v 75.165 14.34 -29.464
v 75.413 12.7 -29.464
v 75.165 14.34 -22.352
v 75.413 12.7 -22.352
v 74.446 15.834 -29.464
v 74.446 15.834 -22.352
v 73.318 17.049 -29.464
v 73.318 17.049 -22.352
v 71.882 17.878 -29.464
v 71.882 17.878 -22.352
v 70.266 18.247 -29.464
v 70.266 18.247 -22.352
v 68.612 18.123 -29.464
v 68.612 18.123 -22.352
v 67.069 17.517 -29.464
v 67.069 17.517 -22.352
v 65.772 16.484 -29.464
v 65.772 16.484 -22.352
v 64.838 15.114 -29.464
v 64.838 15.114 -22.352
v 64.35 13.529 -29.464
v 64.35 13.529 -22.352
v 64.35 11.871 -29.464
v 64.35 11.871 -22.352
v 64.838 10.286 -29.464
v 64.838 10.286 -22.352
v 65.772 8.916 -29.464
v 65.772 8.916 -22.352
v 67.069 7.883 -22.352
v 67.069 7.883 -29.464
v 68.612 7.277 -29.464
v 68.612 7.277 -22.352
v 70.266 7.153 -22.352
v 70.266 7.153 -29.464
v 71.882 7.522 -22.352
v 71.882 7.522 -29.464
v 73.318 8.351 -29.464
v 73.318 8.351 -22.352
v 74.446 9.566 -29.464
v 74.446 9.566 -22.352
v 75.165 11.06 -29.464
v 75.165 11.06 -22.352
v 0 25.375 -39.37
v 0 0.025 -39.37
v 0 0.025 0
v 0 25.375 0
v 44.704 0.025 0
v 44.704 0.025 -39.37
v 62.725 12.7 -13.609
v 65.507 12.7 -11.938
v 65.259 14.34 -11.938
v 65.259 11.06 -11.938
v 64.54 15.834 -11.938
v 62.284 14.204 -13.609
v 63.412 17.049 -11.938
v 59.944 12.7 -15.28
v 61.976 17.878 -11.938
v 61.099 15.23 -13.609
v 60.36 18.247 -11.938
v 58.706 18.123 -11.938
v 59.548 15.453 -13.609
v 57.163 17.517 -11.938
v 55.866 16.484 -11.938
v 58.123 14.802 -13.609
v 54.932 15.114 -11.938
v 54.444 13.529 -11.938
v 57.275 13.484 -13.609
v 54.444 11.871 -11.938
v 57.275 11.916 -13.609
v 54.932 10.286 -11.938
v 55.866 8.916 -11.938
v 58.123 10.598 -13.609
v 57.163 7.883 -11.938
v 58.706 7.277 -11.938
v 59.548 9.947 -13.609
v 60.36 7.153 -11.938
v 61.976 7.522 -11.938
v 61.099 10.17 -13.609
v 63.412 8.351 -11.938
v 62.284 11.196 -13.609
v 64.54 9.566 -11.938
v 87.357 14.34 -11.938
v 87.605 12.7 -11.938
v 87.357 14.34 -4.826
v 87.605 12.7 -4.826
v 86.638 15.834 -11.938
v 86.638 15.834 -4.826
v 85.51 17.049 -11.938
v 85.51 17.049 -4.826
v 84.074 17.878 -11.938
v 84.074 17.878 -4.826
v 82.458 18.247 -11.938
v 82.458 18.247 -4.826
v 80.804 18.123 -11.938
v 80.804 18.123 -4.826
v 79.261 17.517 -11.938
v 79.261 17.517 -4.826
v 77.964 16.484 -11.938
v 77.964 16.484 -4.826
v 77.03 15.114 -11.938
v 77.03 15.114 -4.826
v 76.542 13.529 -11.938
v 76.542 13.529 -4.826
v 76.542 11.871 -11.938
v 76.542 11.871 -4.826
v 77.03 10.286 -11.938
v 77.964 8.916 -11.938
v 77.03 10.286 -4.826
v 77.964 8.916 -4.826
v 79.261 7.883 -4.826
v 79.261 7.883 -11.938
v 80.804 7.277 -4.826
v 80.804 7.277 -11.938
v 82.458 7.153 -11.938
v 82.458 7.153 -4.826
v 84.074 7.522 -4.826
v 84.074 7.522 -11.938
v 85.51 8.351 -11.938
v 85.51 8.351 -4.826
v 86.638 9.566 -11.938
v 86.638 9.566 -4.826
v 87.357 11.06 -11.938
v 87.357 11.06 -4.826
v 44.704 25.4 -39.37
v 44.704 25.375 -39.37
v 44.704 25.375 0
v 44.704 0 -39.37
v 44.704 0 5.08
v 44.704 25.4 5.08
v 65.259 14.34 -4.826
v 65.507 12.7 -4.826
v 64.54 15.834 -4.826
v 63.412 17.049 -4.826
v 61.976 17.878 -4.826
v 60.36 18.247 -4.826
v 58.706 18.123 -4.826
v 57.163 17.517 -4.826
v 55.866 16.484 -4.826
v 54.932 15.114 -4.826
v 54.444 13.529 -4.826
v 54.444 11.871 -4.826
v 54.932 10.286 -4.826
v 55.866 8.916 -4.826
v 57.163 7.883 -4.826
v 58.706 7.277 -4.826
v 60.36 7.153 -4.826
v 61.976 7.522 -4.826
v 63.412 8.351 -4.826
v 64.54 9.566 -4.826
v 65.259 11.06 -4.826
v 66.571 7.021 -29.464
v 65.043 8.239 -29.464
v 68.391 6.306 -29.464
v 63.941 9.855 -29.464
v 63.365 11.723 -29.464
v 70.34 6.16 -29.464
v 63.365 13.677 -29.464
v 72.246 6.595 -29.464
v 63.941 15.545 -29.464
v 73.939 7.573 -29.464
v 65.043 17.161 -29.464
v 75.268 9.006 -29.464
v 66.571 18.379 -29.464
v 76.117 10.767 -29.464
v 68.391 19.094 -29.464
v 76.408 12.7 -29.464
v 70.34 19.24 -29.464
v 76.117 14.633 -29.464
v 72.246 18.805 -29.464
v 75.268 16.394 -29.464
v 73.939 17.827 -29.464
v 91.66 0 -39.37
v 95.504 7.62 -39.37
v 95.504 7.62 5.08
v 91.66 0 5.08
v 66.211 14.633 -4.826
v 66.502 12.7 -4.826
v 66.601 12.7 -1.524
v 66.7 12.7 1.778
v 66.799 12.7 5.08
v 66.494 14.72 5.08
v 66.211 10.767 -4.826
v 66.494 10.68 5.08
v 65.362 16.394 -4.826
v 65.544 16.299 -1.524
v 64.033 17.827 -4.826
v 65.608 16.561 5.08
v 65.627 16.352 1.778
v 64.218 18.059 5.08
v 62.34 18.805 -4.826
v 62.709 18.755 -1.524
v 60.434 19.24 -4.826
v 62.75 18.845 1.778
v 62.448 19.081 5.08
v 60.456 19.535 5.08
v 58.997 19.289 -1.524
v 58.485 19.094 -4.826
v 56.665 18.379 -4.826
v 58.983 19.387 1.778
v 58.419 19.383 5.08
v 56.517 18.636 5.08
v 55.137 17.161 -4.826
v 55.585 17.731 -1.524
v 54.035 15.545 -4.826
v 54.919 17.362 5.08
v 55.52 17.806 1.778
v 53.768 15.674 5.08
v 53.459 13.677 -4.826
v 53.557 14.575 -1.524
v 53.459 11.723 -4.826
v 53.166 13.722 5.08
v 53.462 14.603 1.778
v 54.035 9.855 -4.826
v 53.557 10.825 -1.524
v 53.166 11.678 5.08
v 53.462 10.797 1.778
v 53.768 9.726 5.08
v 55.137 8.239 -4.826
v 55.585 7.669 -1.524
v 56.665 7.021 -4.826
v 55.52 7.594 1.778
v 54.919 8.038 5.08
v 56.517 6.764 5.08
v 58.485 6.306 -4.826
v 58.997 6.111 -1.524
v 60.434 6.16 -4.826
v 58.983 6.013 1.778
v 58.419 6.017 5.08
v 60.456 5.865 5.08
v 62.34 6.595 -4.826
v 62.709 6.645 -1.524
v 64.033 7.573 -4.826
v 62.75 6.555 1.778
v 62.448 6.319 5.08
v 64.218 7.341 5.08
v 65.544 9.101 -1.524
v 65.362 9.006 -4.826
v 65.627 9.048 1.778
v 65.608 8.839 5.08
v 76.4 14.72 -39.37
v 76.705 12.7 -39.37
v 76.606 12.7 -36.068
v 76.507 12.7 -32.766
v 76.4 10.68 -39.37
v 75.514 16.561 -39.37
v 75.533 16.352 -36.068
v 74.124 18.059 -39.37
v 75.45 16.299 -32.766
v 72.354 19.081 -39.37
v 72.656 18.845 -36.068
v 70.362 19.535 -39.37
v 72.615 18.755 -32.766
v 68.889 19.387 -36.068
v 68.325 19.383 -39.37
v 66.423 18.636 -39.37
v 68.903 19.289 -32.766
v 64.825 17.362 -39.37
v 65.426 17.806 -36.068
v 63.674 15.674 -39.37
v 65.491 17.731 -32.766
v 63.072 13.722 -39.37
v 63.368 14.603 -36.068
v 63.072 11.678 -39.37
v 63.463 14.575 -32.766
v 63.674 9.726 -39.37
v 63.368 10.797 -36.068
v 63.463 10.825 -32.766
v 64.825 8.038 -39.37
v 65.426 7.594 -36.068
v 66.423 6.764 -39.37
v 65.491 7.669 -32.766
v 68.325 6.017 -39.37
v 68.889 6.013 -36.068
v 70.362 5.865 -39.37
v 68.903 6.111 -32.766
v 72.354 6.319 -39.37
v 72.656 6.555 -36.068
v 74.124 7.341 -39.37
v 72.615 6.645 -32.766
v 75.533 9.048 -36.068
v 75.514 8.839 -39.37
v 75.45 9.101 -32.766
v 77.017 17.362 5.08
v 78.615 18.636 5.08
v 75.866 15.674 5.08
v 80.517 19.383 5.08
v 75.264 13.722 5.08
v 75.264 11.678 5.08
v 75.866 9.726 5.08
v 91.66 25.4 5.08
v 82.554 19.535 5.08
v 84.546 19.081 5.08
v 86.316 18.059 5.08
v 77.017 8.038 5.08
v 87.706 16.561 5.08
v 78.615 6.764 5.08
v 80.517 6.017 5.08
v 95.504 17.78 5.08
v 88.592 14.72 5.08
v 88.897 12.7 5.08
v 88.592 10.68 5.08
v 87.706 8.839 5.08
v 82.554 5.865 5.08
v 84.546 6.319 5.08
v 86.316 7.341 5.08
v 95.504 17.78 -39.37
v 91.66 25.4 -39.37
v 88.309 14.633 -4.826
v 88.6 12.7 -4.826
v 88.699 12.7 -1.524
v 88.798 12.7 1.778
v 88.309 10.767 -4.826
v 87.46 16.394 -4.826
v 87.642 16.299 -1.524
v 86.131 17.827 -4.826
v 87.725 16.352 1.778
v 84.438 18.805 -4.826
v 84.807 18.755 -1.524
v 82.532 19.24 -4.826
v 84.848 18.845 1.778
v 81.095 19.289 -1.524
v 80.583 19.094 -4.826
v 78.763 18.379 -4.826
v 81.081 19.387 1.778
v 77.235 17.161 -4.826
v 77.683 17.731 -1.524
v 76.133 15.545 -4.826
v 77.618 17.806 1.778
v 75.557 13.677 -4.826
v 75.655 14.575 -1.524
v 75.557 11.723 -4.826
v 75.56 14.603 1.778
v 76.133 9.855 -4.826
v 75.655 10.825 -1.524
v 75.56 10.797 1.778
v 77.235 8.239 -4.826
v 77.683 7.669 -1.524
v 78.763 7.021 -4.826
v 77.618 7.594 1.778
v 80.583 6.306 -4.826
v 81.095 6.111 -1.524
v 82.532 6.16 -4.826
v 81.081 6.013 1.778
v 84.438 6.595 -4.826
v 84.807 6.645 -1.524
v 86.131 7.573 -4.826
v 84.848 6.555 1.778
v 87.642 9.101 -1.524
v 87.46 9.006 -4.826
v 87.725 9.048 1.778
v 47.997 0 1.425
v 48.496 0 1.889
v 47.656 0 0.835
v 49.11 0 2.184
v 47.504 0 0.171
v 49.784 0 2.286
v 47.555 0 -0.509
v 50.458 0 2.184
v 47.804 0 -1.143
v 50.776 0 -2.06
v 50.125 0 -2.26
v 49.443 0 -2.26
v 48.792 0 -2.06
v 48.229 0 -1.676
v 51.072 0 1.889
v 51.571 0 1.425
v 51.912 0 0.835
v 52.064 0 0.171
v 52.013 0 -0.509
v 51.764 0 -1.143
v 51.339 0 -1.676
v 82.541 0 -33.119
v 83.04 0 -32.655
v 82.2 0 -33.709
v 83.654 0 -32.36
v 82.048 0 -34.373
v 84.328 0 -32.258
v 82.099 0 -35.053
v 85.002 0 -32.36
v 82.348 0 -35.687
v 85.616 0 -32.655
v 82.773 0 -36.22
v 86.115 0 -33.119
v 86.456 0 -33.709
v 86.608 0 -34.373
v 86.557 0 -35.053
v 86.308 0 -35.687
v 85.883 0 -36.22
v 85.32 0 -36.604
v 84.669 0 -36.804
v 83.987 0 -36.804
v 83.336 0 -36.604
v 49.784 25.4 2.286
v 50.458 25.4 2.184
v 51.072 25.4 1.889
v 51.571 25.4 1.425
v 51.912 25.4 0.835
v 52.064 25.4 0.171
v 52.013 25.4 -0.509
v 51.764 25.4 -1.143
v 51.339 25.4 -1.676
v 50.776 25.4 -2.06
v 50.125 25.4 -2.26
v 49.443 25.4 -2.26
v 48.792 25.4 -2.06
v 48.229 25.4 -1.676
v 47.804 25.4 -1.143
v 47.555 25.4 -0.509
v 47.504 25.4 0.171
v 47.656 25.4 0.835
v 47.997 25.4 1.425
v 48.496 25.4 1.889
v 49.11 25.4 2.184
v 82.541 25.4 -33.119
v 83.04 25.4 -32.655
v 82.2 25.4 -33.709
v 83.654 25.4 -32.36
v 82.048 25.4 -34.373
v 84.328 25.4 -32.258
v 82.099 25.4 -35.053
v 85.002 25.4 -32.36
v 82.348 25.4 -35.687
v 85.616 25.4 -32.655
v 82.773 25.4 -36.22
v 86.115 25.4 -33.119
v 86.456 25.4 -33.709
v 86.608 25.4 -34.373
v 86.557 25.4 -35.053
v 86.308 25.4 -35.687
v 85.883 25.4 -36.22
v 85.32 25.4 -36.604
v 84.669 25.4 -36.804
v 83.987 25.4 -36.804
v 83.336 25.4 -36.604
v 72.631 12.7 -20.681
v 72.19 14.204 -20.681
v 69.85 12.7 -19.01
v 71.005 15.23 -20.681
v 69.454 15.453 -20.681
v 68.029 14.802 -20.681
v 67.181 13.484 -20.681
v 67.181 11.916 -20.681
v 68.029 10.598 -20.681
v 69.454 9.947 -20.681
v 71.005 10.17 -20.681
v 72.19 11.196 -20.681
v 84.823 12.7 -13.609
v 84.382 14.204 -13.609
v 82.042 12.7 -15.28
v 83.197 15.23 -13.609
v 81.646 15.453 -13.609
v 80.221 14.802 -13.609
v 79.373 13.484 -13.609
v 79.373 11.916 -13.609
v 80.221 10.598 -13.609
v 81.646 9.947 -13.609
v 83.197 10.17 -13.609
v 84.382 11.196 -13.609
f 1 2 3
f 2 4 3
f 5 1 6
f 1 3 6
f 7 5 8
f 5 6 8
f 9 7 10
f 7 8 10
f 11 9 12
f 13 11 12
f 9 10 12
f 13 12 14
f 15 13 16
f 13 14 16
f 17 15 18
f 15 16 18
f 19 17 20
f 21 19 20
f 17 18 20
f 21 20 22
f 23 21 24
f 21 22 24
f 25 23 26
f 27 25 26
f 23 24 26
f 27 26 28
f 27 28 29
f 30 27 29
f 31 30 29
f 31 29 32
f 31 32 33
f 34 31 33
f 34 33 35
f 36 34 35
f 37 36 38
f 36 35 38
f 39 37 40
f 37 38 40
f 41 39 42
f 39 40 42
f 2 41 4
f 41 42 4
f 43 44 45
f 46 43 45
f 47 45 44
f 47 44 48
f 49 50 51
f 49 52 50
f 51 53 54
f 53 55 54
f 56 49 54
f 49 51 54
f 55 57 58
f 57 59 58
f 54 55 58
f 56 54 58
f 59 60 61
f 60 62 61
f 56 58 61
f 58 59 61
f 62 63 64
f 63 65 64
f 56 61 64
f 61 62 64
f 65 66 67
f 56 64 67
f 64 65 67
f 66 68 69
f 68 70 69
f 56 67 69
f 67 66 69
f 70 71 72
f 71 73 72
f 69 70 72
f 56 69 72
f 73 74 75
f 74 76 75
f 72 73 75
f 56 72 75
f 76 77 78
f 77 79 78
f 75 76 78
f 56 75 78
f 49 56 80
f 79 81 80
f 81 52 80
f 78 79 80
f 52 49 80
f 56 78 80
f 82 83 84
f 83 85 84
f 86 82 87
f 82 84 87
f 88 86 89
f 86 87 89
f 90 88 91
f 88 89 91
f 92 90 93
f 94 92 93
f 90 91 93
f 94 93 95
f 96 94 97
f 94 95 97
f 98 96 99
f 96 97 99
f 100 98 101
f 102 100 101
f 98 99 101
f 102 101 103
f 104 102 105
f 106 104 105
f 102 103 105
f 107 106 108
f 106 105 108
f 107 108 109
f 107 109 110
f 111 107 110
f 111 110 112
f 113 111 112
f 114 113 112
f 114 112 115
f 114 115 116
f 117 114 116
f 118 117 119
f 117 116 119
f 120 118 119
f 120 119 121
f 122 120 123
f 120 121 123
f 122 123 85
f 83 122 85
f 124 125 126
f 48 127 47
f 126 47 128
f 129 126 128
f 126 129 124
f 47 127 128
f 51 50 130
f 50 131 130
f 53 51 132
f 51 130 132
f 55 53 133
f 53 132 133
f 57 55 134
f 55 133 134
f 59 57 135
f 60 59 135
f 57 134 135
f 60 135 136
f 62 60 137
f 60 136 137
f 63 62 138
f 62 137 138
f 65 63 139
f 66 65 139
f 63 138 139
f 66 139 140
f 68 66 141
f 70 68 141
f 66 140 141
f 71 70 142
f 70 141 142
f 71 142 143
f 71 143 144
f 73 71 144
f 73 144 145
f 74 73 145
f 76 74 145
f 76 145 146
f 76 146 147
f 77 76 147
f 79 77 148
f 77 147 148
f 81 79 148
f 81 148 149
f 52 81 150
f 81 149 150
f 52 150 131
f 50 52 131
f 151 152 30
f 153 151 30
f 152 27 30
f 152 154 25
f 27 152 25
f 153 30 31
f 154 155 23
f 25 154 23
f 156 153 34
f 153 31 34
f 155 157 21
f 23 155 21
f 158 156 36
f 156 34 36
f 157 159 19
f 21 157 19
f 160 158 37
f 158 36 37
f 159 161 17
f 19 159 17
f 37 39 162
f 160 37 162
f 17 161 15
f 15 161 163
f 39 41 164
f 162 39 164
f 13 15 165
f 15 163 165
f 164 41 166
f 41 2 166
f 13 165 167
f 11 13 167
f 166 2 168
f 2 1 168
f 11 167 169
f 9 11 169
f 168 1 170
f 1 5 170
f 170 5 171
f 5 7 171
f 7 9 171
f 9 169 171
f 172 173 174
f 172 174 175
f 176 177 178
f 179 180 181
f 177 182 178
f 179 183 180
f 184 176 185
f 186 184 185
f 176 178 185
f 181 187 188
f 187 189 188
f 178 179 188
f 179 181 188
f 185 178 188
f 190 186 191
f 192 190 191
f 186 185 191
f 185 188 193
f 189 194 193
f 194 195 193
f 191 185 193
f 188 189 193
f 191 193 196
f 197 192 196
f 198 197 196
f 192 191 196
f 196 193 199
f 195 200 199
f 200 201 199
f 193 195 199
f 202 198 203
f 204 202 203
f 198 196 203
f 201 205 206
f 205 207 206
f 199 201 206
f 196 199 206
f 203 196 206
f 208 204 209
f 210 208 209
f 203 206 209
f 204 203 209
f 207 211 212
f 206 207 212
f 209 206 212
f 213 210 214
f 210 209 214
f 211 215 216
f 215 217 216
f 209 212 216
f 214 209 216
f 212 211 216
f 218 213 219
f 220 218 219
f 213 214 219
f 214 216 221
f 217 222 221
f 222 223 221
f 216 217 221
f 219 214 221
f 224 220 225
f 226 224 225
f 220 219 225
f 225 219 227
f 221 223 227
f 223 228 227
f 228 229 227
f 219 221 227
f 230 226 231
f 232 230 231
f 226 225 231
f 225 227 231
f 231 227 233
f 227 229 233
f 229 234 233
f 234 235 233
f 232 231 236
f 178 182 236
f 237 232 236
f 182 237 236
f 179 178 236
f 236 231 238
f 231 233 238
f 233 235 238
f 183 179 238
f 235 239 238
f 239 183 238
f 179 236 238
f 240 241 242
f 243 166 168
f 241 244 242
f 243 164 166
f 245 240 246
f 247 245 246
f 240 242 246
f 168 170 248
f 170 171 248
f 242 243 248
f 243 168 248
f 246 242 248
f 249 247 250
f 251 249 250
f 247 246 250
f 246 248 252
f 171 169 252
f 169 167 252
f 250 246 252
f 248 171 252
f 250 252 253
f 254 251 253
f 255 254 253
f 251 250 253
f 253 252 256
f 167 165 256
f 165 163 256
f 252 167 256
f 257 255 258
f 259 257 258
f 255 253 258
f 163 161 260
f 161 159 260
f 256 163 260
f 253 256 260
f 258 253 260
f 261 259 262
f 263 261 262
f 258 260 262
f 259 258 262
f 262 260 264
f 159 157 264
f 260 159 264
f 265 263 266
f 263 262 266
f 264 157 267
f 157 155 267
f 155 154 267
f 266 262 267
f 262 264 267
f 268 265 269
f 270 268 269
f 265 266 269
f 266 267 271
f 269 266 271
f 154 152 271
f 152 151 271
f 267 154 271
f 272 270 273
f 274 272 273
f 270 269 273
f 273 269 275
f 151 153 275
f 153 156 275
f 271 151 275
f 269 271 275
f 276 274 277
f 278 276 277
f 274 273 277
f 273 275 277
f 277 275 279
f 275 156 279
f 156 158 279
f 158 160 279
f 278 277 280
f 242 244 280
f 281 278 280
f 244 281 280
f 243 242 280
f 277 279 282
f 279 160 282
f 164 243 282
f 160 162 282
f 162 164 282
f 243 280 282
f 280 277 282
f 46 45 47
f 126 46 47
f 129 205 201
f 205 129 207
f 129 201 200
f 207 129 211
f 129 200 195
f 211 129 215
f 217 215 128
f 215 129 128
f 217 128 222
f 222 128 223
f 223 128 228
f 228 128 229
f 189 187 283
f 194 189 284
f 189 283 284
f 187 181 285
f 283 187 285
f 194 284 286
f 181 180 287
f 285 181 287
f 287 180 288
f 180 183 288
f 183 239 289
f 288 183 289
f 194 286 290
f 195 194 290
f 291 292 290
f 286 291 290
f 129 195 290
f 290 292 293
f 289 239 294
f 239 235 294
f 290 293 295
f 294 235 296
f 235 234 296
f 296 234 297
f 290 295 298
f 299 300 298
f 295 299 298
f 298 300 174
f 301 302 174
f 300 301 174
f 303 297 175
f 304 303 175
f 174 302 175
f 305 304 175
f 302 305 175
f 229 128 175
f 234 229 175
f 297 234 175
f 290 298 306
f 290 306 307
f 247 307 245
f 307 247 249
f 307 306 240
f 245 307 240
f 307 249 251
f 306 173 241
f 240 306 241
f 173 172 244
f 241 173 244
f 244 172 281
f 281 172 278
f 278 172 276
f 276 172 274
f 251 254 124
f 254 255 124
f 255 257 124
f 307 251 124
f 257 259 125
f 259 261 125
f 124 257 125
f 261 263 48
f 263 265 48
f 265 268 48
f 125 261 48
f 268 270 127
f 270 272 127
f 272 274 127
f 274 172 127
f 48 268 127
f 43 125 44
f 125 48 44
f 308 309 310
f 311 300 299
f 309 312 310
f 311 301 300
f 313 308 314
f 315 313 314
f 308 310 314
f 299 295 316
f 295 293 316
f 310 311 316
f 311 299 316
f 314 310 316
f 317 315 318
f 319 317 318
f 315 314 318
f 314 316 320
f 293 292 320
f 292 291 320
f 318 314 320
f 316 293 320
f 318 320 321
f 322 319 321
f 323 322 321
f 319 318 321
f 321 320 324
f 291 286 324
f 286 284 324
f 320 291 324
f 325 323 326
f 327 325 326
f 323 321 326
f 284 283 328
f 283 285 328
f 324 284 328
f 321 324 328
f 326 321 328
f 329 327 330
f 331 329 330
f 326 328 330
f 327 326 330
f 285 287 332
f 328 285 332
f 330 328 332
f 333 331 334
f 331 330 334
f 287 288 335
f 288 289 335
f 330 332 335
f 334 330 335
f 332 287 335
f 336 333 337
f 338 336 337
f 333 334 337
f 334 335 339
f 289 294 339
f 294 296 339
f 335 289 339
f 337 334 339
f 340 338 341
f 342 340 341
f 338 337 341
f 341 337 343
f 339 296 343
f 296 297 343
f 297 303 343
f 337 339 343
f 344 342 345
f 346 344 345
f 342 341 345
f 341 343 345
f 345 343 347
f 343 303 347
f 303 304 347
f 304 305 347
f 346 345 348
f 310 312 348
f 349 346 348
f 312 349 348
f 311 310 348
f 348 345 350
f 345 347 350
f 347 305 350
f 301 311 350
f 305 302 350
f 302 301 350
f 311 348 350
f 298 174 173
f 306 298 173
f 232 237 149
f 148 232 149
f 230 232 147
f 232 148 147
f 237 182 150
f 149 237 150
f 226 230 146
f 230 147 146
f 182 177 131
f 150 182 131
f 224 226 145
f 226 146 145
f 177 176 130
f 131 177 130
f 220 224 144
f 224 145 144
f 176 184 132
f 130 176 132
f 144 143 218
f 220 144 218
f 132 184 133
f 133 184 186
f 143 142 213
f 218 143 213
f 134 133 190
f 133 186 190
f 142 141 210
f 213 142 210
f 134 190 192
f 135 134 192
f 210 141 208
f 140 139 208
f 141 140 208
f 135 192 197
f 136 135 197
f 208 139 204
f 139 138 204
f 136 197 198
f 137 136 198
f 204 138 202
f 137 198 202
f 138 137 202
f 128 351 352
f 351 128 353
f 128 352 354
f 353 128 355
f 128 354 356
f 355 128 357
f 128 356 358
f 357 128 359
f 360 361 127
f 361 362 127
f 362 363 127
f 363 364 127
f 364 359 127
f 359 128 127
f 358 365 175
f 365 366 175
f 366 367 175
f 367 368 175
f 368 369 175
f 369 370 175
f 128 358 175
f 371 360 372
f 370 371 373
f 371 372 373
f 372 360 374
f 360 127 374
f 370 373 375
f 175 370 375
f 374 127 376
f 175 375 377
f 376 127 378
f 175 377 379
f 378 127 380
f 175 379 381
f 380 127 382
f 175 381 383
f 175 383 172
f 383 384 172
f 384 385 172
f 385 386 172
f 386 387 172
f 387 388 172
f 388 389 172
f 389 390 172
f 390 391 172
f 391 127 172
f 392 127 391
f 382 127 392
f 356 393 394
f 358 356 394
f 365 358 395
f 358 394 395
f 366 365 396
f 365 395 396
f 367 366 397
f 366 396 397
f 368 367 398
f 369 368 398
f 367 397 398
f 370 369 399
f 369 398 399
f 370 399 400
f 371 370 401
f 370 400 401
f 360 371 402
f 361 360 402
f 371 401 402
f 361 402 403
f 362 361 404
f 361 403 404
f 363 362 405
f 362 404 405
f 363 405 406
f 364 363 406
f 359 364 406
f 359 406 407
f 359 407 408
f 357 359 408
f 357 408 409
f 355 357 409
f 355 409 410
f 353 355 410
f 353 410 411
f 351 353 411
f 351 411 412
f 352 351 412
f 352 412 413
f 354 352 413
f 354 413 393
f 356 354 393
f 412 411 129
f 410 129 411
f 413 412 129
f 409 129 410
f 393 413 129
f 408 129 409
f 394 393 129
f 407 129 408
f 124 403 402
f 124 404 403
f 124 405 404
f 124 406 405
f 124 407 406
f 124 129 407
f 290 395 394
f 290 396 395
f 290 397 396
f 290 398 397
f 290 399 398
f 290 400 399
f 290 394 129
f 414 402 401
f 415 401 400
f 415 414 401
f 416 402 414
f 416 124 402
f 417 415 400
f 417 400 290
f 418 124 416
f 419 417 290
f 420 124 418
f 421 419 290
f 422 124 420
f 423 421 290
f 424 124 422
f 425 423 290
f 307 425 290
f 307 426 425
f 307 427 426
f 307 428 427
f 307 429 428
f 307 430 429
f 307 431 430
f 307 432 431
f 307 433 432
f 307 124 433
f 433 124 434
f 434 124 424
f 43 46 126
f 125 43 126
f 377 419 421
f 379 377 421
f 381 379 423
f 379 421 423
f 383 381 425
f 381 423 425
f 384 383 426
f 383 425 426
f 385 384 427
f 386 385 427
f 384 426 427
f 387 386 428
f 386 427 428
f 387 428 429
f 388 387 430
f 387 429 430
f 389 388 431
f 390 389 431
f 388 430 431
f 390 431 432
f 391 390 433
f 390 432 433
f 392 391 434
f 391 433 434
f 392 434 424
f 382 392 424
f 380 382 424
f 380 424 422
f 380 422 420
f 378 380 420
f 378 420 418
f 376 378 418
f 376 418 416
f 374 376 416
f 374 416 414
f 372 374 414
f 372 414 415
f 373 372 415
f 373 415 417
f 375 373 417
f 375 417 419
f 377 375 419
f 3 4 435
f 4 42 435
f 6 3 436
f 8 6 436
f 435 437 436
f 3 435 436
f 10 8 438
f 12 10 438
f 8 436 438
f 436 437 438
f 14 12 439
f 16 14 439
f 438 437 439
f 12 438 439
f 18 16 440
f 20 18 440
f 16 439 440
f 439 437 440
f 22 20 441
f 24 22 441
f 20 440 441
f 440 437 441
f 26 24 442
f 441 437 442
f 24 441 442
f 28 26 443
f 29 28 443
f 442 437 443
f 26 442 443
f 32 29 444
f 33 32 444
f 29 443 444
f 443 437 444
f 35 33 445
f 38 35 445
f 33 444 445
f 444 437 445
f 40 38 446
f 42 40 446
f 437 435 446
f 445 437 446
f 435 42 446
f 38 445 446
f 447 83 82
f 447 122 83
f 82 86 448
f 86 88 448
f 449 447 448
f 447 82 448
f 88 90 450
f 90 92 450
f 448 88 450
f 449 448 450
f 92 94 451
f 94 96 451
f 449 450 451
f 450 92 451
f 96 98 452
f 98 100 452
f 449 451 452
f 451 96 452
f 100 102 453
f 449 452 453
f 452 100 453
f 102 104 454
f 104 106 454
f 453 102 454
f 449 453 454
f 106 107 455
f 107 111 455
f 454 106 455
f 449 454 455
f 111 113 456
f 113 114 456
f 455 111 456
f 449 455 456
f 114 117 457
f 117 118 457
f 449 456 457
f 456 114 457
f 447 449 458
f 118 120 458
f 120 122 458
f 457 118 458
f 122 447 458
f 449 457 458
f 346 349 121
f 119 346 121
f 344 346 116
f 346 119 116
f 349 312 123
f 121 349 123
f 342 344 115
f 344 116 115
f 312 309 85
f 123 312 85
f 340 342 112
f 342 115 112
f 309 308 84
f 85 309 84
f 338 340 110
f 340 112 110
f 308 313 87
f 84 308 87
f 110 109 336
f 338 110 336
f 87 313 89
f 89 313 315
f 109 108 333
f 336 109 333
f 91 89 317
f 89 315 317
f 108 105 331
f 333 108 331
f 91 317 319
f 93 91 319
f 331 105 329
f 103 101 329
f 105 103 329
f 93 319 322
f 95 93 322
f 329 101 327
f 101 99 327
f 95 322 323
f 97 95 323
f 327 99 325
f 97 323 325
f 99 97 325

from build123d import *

# Parameters (mm, degrees)
BOSS_EXTRUDE1_DEPTH = 25.4
SKETCH2_W           = 44.704
SKETCH2_H           = 0.0254
CUT_EXTRUDE1_DEPTH  = 107.377492525
SKETCH3_R           = 2.286
CUT_EXTRUDE2_DEPTH  = 107.377492525
CUT_EXTRUDE3_DEPTH  = 109.360401051


# Read off the part's stored shape, not the designer's step: 1/4 NPT Tapped Hole1
with BuildPart() as part:
    # Sketch1 → Boss-Extrude1 (new body)
    with BuildSketch(Plane(origin=(0, 0, 0), x_dir=(1, 0, 0), z_dir=(0, 1, 0))):
        Polygon((44.704, -5.08), (95.504, -5.08), (95.504, 39.37), (0, 39.37), (0, 0), (44.704, 0), align=None)
    extrude(amount=BOSS_EXTRUDE1_DEPTH)

    # Sketch2 → Cut-Extrude1 (cut, through all)
    with BuildSketch(Plane.XY):
        with Locations((22.352, 25.3873)):
            Rectangle(SKETCH2_W, SKETCH2_H)
        with Locations((22.352, 0.0127)):
            Rectangle(SKETCH2_W, SKETCH2_H)
    extrude(amount=-CUT_EXTRUDE1_DEPTH, mode=Mode.SUBTRACT)

    # Sketch3 → Cut-Extrude2 (cut, through all)
    with BuildSketch(Plane(origin=(0, 25.4, 0), x_dir=(1, 0, 0), z_dir=(0, 1, 0))):
        with Locations(Location((49.784, 0, 0), (0, 0, 270))):
            Circle(SKETCH3_R)
        with Locations(Location((84.328, 34.544, 0), (0, 0, 270))):
            Circle(SKETCH3_R)
    extrude(amount=-CUT_EXTRUDE2_DEPTH, mode=Mode.SUBTRACT)

    # 1/4 NPT Tapped Hole1 outline → 1/4 NPT Tapped Hole1 (revolve, cut)
    with BuildSketch(Plane(origin=(69.85, 12.7, 0), x_dir=(1, 0, 0), z_dir=(0, -1, 0))):
        Polygon((5.5626, -22.352), (0, -19.009652721), (0, -39.37), (6.8545837, -39.37), (6.557984794, -29.464), (5.5626, -29.464), align=None)
    revolve(axis=Axis((69.85, 12.7, 0), (0, 0, 1)), mode=Mode.SUBTRACT)

    # 1_4 NPT Tapped Hole1 2 outline → 1_4 NPT Tapped Hole1 2 (revolve, cut)
    with BuildSketch(Plane(origin=(82.042, 12.7, 0), x_dir=(1, 0, 0), z_dir=(0, -1, 0))):
        Polygon((0, 5.08), (0, -15.280347279), (5.5626, -11.938), (5.5626, -4.826), (6.557984794, -4.826), (6.8545837, 5.08), align=None)
    revolve(axis=Axis((82.042, 12.7, 0), (0, 0, 1)), mode=Mode.SUBTRACT)

    # 1_4 NPT Tapped Hole1 3 outline → 1_4 NPT Tapped Hole1 3 (revolve, cut)
    with BuildSketch(Plane(origin=(59.944, 12.7, 0), x_dir=(1, 0, 0), z_dir=(0, -1, 0))):
        Polygon((6.8545837, 5.08), (0, 5.08), (0, -15.280347279), (5.5626, -11.938), (5.5626, -4.826), (6.557984794, -4.826), align=None)
    revolve(axis=Axis((59.944, 12.7, 0), (0, 0, 1)), mode=Mode.SUBTRACT)

    # Sketch7 → Cut-Extrude3 (cut, through all)
    with BuildSketch(Plane.XY.offset(5.08)):
        Polygon((95.504, 25.4), (95.504, 17.78), (91.660260387, 25.4), align=None)
        Polygon((91.660260387, 0), (95.504, 0), (95.504, 7.62), align=None)
    extrude(amount=-CUT_EXTRUDE3_DEPTH, mode=Mode.SUBTRACT)


solid = part.part
